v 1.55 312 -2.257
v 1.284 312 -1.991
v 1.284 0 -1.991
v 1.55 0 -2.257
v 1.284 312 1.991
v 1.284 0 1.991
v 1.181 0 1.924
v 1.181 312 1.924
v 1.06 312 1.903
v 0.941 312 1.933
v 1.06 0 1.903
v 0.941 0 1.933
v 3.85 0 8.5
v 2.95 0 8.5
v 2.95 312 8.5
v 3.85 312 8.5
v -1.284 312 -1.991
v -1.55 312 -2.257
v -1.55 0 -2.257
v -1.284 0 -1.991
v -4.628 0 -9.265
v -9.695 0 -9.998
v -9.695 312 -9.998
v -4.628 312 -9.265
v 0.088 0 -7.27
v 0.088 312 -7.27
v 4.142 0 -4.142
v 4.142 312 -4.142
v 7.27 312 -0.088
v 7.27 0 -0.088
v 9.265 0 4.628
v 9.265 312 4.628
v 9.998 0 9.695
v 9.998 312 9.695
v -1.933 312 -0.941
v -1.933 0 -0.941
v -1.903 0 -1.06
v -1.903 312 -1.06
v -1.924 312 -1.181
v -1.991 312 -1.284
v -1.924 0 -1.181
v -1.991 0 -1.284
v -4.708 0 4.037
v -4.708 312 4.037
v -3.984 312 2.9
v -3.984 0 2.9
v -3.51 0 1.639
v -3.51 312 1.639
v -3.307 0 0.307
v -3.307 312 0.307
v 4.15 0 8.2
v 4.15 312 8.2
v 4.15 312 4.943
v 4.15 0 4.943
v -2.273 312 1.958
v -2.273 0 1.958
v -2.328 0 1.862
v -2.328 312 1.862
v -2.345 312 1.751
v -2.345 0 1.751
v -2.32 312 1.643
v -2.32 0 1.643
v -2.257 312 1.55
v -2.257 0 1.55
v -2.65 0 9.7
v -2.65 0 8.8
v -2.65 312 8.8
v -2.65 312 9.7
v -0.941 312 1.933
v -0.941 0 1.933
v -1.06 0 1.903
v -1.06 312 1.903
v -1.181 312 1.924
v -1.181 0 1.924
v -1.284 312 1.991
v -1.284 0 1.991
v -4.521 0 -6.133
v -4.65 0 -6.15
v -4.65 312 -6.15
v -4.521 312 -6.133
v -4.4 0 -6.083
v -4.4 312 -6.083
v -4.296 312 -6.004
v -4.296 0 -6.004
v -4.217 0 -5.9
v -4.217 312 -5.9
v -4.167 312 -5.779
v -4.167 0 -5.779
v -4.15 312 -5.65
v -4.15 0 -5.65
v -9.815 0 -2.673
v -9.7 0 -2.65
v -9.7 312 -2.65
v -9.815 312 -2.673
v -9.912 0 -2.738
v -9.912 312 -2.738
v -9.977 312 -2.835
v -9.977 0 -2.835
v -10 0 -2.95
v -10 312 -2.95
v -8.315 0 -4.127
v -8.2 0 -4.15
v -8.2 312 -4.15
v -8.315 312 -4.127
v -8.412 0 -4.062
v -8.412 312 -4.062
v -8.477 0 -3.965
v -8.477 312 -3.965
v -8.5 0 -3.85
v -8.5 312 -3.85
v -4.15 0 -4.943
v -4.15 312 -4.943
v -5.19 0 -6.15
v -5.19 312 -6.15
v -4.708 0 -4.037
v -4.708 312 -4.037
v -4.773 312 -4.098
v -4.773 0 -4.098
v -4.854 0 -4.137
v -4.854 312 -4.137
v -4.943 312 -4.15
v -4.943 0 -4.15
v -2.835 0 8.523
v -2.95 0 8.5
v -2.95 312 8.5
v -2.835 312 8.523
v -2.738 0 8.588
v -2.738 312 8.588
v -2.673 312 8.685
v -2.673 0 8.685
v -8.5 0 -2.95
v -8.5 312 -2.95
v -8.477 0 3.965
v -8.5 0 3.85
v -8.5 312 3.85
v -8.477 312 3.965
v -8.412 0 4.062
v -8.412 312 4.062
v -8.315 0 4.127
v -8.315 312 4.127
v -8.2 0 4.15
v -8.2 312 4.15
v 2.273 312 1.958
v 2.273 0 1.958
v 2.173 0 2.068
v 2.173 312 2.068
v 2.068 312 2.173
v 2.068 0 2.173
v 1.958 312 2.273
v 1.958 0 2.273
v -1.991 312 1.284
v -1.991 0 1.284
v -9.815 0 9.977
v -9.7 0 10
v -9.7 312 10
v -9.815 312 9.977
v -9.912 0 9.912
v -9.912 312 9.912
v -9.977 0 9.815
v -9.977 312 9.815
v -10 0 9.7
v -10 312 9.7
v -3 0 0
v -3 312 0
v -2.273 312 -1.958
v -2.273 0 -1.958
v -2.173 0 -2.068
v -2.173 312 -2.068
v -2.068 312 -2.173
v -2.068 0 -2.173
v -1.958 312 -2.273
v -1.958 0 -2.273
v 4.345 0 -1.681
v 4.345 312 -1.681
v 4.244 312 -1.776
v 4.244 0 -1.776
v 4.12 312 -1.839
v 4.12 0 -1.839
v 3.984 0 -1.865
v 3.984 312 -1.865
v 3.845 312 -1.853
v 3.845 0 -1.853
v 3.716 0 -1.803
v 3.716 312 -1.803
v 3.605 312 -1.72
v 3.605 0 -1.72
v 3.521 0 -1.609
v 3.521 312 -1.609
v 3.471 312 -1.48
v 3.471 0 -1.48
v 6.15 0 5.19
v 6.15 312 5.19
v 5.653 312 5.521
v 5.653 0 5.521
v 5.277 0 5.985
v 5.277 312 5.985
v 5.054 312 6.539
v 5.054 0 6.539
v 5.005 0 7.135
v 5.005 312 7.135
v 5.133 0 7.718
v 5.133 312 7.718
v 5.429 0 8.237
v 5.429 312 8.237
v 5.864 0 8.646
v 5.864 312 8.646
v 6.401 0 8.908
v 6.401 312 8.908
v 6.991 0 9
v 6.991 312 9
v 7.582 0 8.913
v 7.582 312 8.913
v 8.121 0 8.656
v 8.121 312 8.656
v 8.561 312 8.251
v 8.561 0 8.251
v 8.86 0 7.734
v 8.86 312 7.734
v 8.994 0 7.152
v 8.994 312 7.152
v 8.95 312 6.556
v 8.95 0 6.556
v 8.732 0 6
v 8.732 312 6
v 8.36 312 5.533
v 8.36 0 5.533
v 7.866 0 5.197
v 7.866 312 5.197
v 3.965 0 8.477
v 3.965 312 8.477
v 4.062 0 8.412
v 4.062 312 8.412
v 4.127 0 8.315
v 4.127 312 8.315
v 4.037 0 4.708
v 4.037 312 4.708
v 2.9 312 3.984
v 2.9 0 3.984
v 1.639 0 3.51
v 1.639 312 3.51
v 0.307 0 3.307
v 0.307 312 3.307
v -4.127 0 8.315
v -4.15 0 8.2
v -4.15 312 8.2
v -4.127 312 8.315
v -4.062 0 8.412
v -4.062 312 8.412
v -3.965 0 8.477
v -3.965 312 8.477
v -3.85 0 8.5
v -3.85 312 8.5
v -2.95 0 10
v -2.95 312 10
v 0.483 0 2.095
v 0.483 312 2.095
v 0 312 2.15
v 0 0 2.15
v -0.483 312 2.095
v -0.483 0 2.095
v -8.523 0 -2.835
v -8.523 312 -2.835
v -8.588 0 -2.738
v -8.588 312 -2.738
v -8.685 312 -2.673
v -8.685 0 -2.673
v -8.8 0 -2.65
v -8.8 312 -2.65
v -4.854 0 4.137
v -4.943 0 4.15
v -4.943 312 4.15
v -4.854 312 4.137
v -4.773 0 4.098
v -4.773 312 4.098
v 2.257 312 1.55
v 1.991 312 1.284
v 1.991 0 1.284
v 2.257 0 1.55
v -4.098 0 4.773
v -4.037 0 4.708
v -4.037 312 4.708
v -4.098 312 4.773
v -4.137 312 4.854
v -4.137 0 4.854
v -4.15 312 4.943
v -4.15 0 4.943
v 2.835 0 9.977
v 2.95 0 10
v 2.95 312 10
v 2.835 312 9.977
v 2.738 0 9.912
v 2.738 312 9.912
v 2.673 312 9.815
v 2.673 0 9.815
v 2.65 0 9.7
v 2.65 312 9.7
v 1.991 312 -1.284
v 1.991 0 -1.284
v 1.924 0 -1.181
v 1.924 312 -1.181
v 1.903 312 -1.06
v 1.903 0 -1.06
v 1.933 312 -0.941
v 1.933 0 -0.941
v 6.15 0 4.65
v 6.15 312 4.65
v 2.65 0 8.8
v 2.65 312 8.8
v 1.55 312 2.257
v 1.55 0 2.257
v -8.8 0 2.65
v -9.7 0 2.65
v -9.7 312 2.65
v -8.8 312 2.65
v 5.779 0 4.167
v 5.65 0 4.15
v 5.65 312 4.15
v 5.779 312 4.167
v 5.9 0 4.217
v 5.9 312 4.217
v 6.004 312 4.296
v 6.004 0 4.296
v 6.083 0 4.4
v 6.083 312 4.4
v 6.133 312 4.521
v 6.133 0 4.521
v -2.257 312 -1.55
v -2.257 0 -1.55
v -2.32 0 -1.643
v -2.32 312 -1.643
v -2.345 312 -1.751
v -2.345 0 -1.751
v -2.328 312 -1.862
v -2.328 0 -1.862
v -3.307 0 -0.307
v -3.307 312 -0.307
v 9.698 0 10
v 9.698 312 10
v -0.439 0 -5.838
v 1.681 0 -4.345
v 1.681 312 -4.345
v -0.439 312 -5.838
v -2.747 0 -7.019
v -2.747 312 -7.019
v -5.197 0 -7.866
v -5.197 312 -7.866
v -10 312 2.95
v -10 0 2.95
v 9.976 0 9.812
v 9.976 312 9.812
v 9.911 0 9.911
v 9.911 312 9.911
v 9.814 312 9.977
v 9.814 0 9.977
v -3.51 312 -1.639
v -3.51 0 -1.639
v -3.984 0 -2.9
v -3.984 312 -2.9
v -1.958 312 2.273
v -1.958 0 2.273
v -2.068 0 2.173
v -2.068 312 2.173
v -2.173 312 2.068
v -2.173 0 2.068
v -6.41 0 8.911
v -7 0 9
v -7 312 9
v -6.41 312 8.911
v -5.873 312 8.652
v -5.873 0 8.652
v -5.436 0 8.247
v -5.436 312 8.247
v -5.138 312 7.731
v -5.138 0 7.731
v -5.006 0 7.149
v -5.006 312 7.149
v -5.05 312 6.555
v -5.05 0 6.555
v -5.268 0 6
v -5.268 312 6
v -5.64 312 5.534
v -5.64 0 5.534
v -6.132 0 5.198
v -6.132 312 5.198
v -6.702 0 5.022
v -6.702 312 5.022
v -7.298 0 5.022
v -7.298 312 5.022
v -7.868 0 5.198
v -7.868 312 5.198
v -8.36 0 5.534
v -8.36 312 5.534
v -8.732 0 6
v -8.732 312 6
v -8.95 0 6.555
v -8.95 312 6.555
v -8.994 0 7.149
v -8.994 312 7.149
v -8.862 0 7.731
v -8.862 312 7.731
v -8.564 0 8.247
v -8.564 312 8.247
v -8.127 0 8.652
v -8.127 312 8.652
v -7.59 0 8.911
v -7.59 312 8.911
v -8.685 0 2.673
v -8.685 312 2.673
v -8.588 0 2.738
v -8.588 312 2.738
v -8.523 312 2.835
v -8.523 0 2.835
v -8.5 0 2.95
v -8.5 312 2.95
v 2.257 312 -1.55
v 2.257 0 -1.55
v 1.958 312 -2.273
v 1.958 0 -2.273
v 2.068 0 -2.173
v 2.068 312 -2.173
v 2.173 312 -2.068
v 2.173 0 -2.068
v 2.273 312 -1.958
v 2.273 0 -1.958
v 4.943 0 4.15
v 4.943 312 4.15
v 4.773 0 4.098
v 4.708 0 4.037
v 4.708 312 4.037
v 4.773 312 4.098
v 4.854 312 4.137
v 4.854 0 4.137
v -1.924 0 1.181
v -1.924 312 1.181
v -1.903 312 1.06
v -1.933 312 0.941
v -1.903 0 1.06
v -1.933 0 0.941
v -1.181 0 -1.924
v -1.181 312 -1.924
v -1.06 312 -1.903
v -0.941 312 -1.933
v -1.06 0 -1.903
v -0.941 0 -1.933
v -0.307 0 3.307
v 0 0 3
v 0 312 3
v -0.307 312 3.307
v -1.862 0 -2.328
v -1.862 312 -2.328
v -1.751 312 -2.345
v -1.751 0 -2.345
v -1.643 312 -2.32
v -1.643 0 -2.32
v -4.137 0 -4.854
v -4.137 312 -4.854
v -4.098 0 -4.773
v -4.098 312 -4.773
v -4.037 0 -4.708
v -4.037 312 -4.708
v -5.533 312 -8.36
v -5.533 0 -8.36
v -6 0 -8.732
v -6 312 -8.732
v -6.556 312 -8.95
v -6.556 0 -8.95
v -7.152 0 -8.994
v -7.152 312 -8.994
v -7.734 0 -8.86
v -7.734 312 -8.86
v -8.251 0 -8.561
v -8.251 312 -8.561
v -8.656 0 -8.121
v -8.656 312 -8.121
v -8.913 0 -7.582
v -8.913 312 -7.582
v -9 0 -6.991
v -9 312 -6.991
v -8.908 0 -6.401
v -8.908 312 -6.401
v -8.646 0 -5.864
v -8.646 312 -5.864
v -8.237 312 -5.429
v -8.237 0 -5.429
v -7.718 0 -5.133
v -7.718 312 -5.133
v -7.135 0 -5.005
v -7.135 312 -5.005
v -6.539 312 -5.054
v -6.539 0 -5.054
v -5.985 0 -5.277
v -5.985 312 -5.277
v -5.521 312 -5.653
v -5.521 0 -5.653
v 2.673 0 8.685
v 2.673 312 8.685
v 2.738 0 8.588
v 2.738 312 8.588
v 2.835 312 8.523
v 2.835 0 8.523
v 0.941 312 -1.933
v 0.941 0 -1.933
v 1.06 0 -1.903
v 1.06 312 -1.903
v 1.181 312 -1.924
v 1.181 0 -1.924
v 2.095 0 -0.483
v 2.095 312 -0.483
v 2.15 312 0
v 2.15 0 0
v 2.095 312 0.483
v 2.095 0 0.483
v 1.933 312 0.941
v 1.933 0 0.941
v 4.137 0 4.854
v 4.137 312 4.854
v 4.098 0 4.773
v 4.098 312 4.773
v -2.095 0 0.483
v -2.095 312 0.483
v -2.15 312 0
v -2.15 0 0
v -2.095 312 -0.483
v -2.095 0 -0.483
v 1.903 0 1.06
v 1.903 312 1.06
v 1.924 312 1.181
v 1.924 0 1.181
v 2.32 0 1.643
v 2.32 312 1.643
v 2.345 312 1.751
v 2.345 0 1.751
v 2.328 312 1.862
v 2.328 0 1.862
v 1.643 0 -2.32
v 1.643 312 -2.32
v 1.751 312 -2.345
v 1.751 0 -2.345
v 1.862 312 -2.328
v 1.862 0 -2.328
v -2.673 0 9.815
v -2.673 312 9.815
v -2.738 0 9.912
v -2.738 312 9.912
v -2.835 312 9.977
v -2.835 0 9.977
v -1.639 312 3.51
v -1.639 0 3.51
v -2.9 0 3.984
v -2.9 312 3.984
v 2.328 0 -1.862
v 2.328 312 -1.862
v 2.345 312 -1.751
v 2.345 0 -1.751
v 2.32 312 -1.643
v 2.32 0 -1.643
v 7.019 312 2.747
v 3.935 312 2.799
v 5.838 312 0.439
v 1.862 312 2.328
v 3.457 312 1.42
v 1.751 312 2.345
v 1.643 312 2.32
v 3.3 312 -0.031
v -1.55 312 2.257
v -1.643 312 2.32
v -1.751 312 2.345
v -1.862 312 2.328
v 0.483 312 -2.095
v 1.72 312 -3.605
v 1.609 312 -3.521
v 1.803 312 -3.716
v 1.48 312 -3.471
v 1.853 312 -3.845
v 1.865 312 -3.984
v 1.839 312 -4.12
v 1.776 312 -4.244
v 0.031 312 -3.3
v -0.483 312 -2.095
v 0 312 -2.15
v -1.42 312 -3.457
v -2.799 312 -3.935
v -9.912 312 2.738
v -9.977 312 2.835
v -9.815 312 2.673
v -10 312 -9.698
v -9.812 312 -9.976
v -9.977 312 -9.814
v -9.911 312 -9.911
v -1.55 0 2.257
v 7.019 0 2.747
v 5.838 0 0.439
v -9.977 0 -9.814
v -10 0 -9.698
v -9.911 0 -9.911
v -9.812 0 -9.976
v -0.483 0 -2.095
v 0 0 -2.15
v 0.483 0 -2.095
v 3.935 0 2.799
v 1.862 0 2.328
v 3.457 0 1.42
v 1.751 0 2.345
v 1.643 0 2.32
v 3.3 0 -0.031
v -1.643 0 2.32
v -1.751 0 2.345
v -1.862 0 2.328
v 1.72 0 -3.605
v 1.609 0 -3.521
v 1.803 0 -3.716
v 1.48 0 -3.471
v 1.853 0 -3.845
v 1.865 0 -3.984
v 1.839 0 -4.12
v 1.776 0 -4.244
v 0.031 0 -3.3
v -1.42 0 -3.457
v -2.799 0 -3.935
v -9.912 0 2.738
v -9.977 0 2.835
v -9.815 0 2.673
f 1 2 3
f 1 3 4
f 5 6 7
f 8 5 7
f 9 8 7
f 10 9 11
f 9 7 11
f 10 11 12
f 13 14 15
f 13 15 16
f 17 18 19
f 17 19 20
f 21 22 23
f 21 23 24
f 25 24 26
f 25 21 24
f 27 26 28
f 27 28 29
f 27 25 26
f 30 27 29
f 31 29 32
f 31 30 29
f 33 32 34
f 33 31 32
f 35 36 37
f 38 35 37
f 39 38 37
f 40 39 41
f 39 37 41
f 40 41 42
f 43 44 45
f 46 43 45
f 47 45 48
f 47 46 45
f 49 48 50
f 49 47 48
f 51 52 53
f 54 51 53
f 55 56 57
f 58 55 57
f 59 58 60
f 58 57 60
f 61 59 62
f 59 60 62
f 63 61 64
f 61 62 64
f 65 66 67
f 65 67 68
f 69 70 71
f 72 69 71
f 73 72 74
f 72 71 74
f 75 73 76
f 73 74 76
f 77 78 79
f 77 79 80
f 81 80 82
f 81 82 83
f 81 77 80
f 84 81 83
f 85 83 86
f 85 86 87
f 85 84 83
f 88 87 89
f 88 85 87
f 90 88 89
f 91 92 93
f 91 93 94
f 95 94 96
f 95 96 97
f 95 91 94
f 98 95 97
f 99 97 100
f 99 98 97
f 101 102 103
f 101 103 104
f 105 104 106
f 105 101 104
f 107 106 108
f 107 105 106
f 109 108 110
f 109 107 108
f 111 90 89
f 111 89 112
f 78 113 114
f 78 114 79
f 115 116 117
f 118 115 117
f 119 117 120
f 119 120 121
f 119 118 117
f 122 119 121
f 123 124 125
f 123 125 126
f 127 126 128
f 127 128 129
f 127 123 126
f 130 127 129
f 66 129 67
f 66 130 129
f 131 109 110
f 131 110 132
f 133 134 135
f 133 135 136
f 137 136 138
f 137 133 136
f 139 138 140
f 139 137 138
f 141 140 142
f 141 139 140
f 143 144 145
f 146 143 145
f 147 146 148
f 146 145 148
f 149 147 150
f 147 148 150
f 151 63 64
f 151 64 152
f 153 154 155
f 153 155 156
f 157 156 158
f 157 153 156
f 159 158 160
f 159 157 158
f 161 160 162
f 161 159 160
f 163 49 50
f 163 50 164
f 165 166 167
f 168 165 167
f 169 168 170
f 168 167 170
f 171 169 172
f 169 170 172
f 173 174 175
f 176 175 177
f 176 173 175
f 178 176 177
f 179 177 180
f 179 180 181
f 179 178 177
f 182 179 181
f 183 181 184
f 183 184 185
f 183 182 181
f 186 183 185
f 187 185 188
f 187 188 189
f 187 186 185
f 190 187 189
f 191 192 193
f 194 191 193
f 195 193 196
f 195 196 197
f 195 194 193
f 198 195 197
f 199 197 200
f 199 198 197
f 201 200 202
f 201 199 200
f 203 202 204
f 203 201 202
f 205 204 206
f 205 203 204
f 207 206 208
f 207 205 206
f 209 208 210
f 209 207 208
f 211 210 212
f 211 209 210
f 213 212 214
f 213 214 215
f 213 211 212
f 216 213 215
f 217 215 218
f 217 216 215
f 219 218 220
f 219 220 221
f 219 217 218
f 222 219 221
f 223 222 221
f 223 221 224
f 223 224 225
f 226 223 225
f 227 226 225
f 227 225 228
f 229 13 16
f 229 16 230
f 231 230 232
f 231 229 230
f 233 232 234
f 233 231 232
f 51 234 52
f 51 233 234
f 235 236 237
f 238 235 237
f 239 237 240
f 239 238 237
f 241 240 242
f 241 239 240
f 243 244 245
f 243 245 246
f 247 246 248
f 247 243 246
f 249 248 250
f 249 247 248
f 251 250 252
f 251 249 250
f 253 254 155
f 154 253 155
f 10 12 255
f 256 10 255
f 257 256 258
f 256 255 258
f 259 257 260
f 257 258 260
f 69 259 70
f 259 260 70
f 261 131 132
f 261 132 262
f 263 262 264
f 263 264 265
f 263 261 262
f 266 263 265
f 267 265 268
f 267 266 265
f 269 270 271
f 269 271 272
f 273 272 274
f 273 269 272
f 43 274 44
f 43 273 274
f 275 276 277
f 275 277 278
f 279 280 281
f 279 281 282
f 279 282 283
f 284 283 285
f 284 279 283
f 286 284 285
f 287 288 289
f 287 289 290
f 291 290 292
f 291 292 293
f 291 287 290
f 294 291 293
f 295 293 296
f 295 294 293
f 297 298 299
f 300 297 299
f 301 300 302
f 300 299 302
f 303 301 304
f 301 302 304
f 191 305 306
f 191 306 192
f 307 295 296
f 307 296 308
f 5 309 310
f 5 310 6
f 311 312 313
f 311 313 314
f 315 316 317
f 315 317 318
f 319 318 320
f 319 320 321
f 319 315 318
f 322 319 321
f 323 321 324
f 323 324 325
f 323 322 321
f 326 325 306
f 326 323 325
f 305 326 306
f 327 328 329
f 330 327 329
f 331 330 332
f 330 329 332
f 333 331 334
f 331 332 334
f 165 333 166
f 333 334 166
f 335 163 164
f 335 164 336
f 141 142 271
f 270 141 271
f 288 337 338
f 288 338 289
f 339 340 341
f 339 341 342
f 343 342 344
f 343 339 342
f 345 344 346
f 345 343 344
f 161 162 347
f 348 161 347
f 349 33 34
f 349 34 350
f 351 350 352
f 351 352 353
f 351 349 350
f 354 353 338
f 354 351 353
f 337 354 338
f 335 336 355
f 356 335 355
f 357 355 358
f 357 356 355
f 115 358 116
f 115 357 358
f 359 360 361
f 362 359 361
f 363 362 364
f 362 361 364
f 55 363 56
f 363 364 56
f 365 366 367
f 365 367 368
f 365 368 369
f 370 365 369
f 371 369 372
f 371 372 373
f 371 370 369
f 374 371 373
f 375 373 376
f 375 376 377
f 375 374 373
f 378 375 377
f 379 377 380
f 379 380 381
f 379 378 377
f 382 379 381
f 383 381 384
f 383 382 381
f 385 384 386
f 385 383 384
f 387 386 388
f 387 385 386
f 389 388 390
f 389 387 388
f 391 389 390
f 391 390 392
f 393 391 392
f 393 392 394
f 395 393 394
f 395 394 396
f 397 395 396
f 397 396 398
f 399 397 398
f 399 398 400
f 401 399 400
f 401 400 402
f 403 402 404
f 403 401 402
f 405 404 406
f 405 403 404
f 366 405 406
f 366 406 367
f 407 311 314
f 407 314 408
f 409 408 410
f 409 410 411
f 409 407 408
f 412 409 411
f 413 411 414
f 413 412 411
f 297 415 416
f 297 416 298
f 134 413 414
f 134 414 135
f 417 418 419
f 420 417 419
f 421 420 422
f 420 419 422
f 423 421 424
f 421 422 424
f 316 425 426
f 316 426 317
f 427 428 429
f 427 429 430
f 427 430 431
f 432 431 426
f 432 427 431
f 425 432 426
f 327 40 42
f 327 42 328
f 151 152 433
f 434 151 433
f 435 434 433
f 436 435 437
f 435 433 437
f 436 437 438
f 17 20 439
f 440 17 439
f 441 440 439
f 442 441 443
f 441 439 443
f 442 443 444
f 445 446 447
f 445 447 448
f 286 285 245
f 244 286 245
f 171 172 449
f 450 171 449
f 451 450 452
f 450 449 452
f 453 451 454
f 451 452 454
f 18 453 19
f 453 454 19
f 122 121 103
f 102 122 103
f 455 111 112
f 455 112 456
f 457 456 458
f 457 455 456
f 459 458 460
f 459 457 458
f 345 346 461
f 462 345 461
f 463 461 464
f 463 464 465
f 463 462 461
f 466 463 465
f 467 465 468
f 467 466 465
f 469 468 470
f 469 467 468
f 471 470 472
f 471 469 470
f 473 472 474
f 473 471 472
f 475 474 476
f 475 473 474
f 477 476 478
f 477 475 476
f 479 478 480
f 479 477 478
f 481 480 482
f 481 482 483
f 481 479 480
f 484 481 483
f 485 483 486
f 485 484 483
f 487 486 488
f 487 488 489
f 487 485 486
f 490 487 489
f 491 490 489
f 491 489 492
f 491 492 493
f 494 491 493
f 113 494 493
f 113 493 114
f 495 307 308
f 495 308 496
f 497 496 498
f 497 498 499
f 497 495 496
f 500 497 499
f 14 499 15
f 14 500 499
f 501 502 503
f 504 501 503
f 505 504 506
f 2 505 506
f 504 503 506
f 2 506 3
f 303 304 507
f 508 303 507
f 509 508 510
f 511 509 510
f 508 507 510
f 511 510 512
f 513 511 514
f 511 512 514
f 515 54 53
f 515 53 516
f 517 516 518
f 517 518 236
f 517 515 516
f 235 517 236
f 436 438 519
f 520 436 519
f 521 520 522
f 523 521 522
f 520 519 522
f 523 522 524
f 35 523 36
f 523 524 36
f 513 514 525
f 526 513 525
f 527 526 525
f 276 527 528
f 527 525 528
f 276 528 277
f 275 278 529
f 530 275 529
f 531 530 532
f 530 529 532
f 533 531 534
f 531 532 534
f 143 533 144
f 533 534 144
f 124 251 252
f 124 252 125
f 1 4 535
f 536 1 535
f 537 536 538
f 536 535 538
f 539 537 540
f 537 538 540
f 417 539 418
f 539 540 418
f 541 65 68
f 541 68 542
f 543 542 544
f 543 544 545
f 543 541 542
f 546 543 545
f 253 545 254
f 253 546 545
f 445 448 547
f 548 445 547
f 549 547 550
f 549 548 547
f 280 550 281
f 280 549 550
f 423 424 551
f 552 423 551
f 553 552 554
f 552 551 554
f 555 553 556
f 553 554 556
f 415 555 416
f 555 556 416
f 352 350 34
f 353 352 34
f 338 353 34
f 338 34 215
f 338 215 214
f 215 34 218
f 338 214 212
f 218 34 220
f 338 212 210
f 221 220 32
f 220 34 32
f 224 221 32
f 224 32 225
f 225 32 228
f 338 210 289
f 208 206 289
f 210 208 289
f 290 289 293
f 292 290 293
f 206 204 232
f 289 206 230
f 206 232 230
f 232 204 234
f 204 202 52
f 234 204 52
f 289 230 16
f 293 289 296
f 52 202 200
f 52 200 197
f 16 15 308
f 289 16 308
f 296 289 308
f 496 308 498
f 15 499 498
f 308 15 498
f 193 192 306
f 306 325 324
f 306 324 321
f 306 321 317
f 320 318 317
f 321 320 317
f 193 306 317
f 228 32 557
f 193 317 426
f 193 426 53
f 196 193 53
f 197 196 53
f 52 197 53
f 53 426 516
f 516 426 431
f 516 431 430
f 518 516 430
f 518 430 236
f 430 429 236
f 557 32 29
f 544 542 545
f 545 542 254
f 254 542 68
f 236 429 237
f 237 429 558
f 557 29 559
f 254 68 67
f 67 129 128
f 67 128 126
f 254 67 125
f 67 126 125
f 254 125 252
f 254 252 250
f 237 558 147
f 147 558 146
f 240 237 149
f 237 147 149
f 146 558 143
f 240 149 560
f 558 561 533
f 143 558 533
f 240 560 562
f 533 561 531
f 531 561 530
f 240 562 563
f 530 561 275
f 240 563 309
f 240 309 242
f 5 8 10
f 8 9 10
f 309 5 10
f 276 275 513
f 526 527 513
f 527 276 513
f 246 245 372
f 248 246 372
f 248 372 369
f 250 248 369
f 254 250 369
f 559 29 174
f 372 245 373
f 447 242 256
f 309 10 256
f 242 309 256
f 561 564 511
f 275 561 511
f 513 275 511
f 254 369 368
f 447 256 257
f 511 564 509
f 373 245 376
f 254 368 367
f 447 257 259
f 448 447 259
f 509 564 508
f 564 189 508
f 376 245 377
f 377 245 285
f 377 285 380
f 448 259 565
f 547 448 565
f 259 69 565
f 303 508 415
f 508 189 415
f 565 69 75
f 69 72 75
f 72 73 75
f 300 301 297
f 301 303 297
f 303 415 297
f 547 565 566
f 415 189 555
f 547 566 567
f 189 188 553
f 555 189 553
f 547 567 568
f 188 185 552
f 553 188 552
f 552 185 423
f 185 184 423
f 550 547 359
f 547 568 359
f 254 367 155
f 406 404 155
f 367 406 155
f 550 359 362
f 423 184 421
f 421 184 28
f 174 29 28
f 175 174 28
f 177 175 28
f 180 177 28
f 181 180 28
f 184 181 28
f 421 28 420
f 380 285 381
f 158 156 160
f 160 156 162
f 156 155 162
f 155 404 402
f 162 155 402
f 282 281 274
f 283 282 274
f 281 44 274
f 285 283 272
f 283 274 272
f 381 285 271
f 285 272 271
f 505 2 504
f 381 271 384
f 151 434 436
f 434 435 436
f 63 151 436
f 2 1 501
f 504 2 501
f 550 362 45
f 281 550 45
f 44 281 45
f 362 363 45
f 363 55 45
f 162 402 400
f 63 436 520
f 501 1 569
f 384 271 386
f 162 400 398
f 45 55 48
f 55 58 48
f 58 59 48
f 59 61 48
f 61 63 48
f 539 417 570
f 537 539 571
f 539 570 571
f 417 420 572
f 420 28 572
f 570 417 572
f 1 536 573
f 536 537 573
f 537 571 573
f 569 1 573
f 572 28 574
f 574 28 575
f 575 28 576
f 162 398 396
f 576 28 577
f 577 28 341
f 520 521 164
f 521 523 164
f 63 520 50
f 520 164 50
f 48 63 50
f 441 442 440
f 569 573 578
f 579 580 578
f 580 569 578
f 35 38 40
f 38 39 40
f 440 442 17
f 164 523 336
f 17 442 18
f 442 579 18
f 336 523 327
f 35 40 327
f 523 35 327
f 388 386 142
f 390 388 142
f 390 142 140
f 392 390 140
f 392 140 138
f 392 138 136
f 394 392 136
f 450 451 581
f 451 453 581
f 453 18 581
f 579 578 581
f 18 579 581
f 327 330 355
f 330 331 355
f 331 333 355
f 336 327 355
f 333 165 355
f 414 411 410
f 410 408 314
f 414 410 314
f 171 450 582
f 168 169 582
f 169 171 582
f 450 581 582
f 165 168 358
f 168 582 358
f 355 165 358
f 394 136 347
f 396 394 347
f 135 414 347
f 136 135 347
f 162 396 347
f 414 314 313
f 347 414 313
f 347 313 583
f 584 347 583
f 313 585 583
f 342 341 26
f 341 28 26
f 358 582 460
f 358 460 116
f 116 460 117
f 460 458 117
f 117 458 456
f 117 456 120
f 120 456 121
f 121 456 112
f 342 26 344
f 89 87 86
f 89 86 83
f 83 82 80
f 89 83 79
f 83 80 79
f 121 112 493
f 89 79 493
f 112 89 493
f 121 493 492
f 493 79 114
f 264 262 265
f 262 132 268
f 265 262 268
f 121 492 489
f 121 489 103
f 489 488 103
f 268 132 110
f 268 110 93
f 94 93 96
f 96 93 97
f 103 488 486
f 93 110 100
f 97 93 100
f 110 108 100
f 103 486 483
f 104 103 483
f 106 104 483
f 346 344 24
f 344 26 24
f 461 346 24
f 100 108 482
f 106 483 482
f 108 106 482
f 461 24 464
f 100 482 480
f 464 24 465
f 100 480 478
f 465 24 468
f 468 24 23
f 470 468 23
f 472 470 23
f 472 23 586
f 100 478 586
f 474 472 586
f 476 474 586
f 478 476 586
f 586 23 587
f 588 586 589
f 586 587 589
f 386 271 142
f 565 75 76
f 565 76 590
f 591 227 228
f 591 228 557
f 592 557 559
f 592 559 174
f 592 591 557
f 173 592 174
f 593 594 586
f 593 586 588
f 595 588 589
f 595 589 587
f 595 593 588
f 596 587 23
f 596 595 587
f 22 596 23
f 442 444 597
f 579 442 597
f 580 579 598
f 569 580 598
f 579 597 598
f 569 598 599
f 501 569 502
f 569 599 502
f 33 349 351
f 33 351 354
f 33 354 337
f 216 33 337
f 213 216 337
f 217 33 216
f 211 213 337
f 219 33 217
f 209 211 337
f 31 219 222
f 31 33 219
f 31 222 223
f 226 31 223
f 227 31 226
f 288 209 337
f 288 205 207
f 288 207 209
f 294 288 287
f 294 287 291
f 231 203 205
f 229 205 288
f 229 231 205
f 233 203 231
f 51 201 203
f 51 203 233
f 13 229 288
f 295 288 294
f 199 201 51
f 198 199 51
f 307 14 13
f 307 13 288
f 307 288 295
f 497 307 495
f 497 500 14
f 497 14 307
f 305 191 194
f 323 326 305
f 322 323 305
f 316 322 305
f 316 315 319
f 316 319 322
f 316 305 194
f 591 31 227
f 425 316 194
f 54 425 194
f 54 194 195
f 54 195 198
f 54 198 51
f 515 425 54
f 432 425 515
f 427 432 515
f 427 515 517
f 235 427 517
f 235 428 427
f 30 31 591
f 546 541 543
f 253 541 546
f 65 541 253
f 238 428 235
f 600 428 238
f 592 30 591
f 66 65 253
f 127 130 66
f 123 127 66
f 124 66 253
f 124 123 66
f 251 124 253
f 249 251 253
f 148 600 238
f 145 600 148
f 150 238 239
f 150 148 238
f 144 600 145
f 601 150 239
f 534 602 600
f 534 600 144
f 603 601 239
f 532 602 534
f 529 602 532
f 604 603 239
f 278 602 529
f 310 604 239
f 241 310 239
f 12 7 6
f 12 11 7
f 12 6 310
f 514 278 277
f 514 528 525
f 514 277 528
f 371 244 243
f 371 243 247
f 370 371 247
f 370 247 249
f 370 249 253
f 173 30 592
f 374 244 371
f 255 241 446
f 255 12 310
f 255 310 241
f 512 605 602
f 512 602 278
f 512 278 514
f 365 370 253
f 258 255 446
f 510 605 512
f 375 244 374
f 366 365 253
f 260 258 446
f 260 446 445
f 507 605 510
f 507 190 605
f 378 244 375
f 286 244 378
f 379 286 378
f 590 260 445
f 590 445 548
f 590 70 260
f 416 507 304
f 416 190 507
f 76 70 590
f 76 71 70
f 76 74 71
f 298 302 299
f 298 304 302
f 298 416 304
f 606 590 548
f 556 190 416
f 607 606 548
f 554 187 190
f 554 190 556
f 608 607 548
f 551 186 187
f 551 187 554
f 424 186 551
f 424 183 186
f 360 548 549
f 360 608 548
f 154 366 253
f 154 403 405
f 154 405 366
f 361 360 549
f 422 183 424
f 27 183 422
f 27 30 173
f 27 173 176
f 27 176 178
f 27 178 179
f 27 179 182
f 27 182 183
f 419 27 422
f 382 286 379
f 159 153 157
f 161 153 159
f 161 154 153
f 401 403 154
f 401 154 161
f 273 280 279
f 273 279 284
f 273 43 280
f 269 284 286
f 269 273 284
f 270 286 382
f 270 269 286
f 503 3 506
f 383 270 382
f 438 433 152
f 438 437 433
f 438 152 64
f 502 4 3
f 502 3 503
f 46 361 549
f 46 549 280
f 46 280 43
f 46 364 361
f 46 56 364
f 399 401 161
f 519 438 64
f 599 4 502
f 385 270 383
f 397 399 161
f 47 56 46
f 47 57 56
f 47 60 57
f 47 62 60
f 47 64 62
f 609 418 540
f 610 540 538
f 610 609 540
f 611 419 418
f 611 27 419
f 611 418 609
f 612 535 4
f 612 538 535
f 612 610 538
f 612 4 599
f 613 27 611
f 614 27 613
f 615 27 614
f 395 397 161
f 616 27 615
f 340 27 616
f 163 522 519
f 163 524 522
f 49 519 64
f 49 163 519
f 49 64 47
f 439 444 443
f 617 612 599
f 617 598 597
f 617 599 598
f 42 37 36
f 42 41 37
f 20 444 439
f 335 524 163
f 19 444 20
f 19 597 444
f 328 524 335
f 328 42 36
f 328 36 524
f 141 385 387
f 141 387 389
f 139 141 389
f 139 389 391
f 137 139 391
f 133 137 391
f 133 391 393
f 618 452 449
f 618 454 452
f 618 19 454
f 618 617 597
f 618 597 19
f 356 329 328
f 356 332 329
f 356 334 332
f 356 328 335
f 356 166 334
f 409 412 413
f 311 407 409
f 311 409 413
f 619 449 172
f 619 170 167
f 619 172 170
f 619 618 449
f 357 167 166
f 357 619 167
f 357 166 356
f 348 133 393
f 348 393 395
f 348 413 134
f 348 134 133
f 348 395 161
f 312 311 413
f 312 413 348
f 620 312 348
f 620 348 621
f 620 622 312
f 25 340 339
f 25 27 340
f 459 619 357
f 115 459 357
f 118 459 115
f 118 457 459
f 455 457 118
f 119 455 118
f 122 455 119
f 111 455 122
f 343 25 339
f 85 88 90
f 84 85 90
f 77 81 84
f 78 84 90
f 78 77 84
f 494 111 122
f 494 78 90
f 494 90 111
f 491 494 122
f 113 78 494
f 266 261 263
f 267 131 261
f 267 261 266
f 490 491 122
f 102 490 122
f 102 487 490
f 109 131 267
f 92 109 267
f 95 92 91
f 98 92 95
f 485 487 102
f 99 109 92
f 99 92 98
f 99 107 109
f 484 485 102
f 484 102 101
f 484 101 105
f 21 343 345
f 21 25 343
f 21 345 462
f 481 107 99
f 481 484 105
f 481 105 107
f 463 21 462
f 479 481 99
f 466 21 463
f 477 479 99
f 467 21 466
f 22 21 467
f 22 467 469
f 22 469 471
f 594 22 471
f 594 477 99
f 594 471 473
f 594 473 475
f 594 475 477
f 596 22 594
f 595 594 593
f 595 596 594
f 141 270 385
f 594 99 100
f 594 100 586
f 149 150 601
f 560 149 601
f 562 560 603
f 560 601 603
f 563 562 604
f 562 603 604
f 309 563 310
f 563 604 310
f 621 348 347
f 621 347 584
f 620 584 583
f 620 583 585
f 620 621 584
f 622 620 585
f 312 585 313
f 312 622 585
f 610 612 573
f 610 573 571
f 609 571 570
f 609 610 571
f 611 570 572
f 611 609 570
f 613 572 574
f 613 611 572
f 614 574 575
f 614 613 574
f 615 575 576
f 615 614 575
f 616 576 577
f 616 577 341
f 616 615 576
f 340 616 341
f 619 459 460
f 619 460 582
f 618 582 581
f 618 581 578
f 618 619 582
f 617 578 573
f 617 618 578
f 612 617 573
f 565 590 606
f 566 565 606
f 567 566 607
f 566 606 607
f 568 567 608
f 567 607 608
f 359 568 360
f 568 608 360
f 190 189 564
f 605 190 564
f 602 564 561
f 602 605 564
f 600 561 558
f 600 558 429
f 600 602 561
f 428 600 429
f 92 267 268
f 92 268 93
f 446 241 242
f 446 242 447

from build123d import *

# Parameters (mm, degrees)
SKETCH_1_R      = 2
EXTRUDE_1_DEPTH = 312


with BuildPart() as part:
    # 스케치1 → 보스-돌출1 (new body)
    with BuildSketch(Plane(origin=(0, 0, 0), x_dir=(1, 0, 0), z_dir=(0, 1, 0))):
        with BuildLine():
            Line((-10, 9.697715604), (-10, 2.95))
            ThreePointArc((-10, 2.95), (-9.912132034, 2.737867966), (-9.7, 2.65))
            Line((-9.7, 2.65), (-8.8, 2.65))
            ThreePointArc((-8.8, 2.65), (-8.587867966, 2.737867966), (-8.5, 2.95))
            Line((-8.5, 2.95), (-8.5, 3.85))
            ThreePointArc((-8.5, 3.85), (-8.412132034, 4.062132034), (-8.2, 4.15))
            Line((-8.2, 4.15), (-4.942749448, 4.15))
            ThreePointArc((-4.942749448, 4.15), (-4.812307598, 4.120157221), (-4.707817398, 4.03656616))
            ThreePointArc((-4.707817398, 4.03656616), (-3.714379176, 2.282021525), (-3.307277366, 0.307277366))
            Line((-3.307277366, 0.307277366), (-3, 0))
            Line((-3, 0), (-3.307277366, -0.307277366))
            ThreePointArc((-3.307277366, -0.307277366), (-3.714379176, -2.282021525), (-4.707817398, -4.03656616))
            ThreePointArc((-4.707817398, -4.03656616), (-4.812307598, -4.120157221), (-4.942749448, -4.15))
            Line((-4.942749448, -4.15), (-8.2, -4.15))
            ThreePointArc((-8.2, -4.15), (-8.412132034, -4.062132034), (-8.5, -3.85))
            Line((-8.5, -3.85), (-8.5, -2.95))
            ThreePointArc((-8.5, -2.95), (-8.587867966, -2.737867966), (-8.8, -2.65))
            Line((-8.8, -2.65), (-9.7, -2.65))
            ThreePointArc((-9.7, -2.65), (-9.912132034, -2.737867966), (-10, -2.95))
            Line((-10, -2.95), (-10, -9.7))
            ThreePointArc((-10, -9.7), (-9.912132034, -9.912132034), (-9.7, -10))
            Line((-9.7, -10), (-2.95, -10))
            ThreePointArc((-2.95, -10), (-2.737867966, -9.912132034), (-2.65, -9.7))
            Line((-2.65, -9.7), (-2.65, -8.8))
            ThreePointArc((-2.65, -8.8), (-2.737867966, -8.587867966), (-2.95, -8.5))
            Line((-2.95, -8.5), (-3.85, -8.5))
            ThreePointArc((-3.85, -8.5), (-4.062132034, -8.412132034), (-4.15, -8.2))
            Line((-4.15, -8.2), (-4.15, -4.942749448))
            ThreePointArc((-4.15, -4.942749448), (-4.120157221, -4.812307599), (-4.03656616, -4.707817398))
            ThreePointArc((-4.03656616, -4.707817398), (-2.282021525, -3.714379176), (-0.307277366, -3.307277366))
            Line((-0.307277366, -3.307277366), (0, -3))
            Line((0, -3), (0.307277366, -3.307277366))
            ThreePointArc((0.307277366, -3.307277366), (2.282021525, -3.714379176), (4.03656616, -4.707817398))
            ThreePointArc((4.03656616, -4.707817398), (4.120157221, -4.812307599), (4.15, -4.942749448))
            Line((4.15, -4.942749448), (4.15, -8.2))
            ThreePointArc((4.15, -8.2), (4.062132034, -8.412132034), (3.85, -8.5))
            Line((3.85, -8.5), (2.95, -8.5))
            ThreePointArc((2.95, -8.5), (2.737867966, -8.587867966), (2.65, -8.8))
            Line((2.65, -8.8), (2.65, -9.7))
            ThreePointArc((2.65, -9.7), (2.737867966, -9.912132034), (2.95, -10))
            Line((2.95, -10), (9.697715604, -10))
            ThreePointArc((9.697715604, -10), (9.911456754, -9.910510619), (9.997680816, -9.695431472))
            ThreePointArc((9.997680816, -9.695431472), (4.142135624, 4.142135624), (-9.695431472, 9.997680816))
            ThreePointArc((-9.695431472, 9.997680816), (-9.910510619, 9.911456754), (-10, 9.697715604))
        make_face()
        with Locations((-7, -7)):
            Circle(SKETCH_1_R, mode=Mode.SUBTRACT)
        with BuildLine():
            Line((6.15, -5.189613301), (6.15, -4.65))
            ThreePointArc((6.15, -4.65), (6.003553391, -4.296446609), (5.65, -4.15))
            Line((5.65, -4.15), (4.942749448, -4.15))
            ThreePointArc((4.942749448, -4.15), (4.812307599, -4.120157221), (4.707817398, -4.03656616))
            ThreePointArc((4.707817398, -4.03656616), (3.457261044, -1.420133589), (3.470927733, 1.479767066))
            ThreePointArc((3.470927733, 1.479767066), (3.845379716, 1.852984885), (4.345476458, 1.681494134))
            ThreePointArc((4.345476458, 1.681494134), (6.468692501, -1.571941665), (7.865655284, -5.197046609))
            ThreePointArc((7.865655284, -5.197046609), (6.991334811, -8.999981229), (6.15, -5.189613301))
        make_face(mode=Mode.SUBTRACT)
        with BuildLine():
            Line((-4.65, 6.15), (-5.189613301, 6.15))
            ThreePointArc((-5.189613301, 6.15), (-8.999981229, 6.991334811), (-5.197046609, 7.865655284))
            ThreePointArc((-5.197046609, 7.865655284), (-1.571941665, 6.468692501), (1.681494134, 4.345476458))
            ThreePointArc((1.681494134, 4.345476458), (1.852984885, 3.845379716), (1.479767066, 3.470927733))
            ThreePointArc((1.479767066, 3.470927733), (-1.420133589, 3.457261044), (-4.03656616, 4.707817398))
            ThreePointArc((-4.03656616, 4.707817398), (-4.120157221, 4.812307598), (-4.15, 4.942749448))
            Line((-4.15, 4.942749448), (-4.15, 5.65))
            ThreePointArc((-4.15, 5.65), (-4.296446609, 6.003553391), (-4.65, 6.15))
        make_face(mode=Mode.SUBTRACT)
        with BuildLine():
            ThreePointArc((-2.27262737, -1.958357689), (-2.345158518, -1.75140317), (-2.257496667, -1.550389886))
            Line((-2.257496667, -1.550389886), (-1.99100568, -1.283898899))
            ThreePointArc((-1.99100568, -1.283898899), (-1.907277277, -1.121431759), (-1.933365749, -0.940530106))
            ThreePointArc((-1.933365749, -0.940530106), (-2.15, 0), (-1.933365749, 0.940530106))
            ThreePointArc((-1.933365749, 0.940530106), (-1.907277277, 1.121431759), (-1.99100568, 1.283898899))
            Line((-1.99100568, 1.283898899), (-2.257496667, 1.550389886))
            ThreePointArc((-2.257496667, 1.550389886), (-2.345158518, 1.75140317), (-2.27262737, 1.958357689))
            ThreePointArc((-2.27262737, 1.958357689), (-2.121320344, 2.121320344), (-1.958357689, 2.27262737))
            ThreePointArc((-1.958357689, 2.27262737), (-1.75140317, 2.345158518), (-1.550389886, 2.257496667))
            Line((-1.550389886, 2.257496667), (-1.283898899, 1.99100568))
            ThreePointArc((-1.283898899, 1.99100568), (-1.121431759, 1.907277277), (-0.940530106, 1.933365749))
            ThreePointArc((-0.940530106, 1.933365749), (0, 2.15), (0.940530106, 1.933365749))
            ThreePointArc((0.940530106, 1.933365749), (1.12143176, 1.907277277), (1.283898899, 1.99100568))
            Line((1.283898899, 1.99100568), (1.550389886, 2.257496667))
            ThreePointArc((1.550389886, 2.257496667), (1.75140317, 2.345158518), (1.958357689, 2.27262737))
            ThreePointArc((1.958357689, 2.27262737), (2.121320344, 2.121320344), (2.27262737, 1.958357689))
            ThreePointArc((2.27262737, 1.958357689), (2.345158518, 1.75140317), (2.257496667, 1.550389886))
            Line((2.257496667, 1.550389886), (1.99100568, 1.283898899))
            ThreePointArc((1.99100568, 1.283898899), (1.907277277, 1.121431759), (1.933365749, 0.940530105))
            ThreePointArc((1.933365749, 0.940530105), (2.15, 0), (1.933365749, -0.940530106))
            ThreePointArc((1.933365749, -0.940530106), (1.907277277, -1.121431759), (1.99100568, -1.283898899))
            Line((1.99100568, -1.283898899), (2.257496667, -1.550389886))
            ThreePointArc((2.257496667, -1.550389886), (2.345158518, -1.75140317), (2.27262737, -1.958357689))
            ThreePointArc((2.27262737, -1.958357689), (2.121320344, -2.121320344), (1.958357689, -2.27262737))
            ThreePointArc((1.958357689, -2.27262737), (1.75140317, -2.345158518), (1.550389886, -2.257496667))
            Line((1.550389886, -2.257496667), (1.283898899, -1.99100568))
            ThreePointArc((1.283898899, -1.99100568), (1.121431759, -1.907277277), (0.940530106, -1.933365749))
            ThreePointArc((0.940530106, -1.933365749), (0, -2.15), (-0.940530105, -1.933365749))
            ThreePointArc((-0.940530105, -1.933365749), (-1.121431759, -1.907277277), (-1.283898899, -1.99100568))
            Line((-1.283898899, -1.99100568), (-1.550389886, -2.257496667))
            ThreePointArc((-1.550389886, -2.257496667), (-1.75140317, -2.345158518), (-1.958357689, -2.27262737))
            ThreePointArc((-1.958357689, -2.27262737), (-2.121320344, -2.121320344), (-2.27262737, -1.958357689))
        make_face(mode=Mode.SUBTRACT)
    extrude(amount=EXTRUDE_1_DEPTH)


solid = part.part
